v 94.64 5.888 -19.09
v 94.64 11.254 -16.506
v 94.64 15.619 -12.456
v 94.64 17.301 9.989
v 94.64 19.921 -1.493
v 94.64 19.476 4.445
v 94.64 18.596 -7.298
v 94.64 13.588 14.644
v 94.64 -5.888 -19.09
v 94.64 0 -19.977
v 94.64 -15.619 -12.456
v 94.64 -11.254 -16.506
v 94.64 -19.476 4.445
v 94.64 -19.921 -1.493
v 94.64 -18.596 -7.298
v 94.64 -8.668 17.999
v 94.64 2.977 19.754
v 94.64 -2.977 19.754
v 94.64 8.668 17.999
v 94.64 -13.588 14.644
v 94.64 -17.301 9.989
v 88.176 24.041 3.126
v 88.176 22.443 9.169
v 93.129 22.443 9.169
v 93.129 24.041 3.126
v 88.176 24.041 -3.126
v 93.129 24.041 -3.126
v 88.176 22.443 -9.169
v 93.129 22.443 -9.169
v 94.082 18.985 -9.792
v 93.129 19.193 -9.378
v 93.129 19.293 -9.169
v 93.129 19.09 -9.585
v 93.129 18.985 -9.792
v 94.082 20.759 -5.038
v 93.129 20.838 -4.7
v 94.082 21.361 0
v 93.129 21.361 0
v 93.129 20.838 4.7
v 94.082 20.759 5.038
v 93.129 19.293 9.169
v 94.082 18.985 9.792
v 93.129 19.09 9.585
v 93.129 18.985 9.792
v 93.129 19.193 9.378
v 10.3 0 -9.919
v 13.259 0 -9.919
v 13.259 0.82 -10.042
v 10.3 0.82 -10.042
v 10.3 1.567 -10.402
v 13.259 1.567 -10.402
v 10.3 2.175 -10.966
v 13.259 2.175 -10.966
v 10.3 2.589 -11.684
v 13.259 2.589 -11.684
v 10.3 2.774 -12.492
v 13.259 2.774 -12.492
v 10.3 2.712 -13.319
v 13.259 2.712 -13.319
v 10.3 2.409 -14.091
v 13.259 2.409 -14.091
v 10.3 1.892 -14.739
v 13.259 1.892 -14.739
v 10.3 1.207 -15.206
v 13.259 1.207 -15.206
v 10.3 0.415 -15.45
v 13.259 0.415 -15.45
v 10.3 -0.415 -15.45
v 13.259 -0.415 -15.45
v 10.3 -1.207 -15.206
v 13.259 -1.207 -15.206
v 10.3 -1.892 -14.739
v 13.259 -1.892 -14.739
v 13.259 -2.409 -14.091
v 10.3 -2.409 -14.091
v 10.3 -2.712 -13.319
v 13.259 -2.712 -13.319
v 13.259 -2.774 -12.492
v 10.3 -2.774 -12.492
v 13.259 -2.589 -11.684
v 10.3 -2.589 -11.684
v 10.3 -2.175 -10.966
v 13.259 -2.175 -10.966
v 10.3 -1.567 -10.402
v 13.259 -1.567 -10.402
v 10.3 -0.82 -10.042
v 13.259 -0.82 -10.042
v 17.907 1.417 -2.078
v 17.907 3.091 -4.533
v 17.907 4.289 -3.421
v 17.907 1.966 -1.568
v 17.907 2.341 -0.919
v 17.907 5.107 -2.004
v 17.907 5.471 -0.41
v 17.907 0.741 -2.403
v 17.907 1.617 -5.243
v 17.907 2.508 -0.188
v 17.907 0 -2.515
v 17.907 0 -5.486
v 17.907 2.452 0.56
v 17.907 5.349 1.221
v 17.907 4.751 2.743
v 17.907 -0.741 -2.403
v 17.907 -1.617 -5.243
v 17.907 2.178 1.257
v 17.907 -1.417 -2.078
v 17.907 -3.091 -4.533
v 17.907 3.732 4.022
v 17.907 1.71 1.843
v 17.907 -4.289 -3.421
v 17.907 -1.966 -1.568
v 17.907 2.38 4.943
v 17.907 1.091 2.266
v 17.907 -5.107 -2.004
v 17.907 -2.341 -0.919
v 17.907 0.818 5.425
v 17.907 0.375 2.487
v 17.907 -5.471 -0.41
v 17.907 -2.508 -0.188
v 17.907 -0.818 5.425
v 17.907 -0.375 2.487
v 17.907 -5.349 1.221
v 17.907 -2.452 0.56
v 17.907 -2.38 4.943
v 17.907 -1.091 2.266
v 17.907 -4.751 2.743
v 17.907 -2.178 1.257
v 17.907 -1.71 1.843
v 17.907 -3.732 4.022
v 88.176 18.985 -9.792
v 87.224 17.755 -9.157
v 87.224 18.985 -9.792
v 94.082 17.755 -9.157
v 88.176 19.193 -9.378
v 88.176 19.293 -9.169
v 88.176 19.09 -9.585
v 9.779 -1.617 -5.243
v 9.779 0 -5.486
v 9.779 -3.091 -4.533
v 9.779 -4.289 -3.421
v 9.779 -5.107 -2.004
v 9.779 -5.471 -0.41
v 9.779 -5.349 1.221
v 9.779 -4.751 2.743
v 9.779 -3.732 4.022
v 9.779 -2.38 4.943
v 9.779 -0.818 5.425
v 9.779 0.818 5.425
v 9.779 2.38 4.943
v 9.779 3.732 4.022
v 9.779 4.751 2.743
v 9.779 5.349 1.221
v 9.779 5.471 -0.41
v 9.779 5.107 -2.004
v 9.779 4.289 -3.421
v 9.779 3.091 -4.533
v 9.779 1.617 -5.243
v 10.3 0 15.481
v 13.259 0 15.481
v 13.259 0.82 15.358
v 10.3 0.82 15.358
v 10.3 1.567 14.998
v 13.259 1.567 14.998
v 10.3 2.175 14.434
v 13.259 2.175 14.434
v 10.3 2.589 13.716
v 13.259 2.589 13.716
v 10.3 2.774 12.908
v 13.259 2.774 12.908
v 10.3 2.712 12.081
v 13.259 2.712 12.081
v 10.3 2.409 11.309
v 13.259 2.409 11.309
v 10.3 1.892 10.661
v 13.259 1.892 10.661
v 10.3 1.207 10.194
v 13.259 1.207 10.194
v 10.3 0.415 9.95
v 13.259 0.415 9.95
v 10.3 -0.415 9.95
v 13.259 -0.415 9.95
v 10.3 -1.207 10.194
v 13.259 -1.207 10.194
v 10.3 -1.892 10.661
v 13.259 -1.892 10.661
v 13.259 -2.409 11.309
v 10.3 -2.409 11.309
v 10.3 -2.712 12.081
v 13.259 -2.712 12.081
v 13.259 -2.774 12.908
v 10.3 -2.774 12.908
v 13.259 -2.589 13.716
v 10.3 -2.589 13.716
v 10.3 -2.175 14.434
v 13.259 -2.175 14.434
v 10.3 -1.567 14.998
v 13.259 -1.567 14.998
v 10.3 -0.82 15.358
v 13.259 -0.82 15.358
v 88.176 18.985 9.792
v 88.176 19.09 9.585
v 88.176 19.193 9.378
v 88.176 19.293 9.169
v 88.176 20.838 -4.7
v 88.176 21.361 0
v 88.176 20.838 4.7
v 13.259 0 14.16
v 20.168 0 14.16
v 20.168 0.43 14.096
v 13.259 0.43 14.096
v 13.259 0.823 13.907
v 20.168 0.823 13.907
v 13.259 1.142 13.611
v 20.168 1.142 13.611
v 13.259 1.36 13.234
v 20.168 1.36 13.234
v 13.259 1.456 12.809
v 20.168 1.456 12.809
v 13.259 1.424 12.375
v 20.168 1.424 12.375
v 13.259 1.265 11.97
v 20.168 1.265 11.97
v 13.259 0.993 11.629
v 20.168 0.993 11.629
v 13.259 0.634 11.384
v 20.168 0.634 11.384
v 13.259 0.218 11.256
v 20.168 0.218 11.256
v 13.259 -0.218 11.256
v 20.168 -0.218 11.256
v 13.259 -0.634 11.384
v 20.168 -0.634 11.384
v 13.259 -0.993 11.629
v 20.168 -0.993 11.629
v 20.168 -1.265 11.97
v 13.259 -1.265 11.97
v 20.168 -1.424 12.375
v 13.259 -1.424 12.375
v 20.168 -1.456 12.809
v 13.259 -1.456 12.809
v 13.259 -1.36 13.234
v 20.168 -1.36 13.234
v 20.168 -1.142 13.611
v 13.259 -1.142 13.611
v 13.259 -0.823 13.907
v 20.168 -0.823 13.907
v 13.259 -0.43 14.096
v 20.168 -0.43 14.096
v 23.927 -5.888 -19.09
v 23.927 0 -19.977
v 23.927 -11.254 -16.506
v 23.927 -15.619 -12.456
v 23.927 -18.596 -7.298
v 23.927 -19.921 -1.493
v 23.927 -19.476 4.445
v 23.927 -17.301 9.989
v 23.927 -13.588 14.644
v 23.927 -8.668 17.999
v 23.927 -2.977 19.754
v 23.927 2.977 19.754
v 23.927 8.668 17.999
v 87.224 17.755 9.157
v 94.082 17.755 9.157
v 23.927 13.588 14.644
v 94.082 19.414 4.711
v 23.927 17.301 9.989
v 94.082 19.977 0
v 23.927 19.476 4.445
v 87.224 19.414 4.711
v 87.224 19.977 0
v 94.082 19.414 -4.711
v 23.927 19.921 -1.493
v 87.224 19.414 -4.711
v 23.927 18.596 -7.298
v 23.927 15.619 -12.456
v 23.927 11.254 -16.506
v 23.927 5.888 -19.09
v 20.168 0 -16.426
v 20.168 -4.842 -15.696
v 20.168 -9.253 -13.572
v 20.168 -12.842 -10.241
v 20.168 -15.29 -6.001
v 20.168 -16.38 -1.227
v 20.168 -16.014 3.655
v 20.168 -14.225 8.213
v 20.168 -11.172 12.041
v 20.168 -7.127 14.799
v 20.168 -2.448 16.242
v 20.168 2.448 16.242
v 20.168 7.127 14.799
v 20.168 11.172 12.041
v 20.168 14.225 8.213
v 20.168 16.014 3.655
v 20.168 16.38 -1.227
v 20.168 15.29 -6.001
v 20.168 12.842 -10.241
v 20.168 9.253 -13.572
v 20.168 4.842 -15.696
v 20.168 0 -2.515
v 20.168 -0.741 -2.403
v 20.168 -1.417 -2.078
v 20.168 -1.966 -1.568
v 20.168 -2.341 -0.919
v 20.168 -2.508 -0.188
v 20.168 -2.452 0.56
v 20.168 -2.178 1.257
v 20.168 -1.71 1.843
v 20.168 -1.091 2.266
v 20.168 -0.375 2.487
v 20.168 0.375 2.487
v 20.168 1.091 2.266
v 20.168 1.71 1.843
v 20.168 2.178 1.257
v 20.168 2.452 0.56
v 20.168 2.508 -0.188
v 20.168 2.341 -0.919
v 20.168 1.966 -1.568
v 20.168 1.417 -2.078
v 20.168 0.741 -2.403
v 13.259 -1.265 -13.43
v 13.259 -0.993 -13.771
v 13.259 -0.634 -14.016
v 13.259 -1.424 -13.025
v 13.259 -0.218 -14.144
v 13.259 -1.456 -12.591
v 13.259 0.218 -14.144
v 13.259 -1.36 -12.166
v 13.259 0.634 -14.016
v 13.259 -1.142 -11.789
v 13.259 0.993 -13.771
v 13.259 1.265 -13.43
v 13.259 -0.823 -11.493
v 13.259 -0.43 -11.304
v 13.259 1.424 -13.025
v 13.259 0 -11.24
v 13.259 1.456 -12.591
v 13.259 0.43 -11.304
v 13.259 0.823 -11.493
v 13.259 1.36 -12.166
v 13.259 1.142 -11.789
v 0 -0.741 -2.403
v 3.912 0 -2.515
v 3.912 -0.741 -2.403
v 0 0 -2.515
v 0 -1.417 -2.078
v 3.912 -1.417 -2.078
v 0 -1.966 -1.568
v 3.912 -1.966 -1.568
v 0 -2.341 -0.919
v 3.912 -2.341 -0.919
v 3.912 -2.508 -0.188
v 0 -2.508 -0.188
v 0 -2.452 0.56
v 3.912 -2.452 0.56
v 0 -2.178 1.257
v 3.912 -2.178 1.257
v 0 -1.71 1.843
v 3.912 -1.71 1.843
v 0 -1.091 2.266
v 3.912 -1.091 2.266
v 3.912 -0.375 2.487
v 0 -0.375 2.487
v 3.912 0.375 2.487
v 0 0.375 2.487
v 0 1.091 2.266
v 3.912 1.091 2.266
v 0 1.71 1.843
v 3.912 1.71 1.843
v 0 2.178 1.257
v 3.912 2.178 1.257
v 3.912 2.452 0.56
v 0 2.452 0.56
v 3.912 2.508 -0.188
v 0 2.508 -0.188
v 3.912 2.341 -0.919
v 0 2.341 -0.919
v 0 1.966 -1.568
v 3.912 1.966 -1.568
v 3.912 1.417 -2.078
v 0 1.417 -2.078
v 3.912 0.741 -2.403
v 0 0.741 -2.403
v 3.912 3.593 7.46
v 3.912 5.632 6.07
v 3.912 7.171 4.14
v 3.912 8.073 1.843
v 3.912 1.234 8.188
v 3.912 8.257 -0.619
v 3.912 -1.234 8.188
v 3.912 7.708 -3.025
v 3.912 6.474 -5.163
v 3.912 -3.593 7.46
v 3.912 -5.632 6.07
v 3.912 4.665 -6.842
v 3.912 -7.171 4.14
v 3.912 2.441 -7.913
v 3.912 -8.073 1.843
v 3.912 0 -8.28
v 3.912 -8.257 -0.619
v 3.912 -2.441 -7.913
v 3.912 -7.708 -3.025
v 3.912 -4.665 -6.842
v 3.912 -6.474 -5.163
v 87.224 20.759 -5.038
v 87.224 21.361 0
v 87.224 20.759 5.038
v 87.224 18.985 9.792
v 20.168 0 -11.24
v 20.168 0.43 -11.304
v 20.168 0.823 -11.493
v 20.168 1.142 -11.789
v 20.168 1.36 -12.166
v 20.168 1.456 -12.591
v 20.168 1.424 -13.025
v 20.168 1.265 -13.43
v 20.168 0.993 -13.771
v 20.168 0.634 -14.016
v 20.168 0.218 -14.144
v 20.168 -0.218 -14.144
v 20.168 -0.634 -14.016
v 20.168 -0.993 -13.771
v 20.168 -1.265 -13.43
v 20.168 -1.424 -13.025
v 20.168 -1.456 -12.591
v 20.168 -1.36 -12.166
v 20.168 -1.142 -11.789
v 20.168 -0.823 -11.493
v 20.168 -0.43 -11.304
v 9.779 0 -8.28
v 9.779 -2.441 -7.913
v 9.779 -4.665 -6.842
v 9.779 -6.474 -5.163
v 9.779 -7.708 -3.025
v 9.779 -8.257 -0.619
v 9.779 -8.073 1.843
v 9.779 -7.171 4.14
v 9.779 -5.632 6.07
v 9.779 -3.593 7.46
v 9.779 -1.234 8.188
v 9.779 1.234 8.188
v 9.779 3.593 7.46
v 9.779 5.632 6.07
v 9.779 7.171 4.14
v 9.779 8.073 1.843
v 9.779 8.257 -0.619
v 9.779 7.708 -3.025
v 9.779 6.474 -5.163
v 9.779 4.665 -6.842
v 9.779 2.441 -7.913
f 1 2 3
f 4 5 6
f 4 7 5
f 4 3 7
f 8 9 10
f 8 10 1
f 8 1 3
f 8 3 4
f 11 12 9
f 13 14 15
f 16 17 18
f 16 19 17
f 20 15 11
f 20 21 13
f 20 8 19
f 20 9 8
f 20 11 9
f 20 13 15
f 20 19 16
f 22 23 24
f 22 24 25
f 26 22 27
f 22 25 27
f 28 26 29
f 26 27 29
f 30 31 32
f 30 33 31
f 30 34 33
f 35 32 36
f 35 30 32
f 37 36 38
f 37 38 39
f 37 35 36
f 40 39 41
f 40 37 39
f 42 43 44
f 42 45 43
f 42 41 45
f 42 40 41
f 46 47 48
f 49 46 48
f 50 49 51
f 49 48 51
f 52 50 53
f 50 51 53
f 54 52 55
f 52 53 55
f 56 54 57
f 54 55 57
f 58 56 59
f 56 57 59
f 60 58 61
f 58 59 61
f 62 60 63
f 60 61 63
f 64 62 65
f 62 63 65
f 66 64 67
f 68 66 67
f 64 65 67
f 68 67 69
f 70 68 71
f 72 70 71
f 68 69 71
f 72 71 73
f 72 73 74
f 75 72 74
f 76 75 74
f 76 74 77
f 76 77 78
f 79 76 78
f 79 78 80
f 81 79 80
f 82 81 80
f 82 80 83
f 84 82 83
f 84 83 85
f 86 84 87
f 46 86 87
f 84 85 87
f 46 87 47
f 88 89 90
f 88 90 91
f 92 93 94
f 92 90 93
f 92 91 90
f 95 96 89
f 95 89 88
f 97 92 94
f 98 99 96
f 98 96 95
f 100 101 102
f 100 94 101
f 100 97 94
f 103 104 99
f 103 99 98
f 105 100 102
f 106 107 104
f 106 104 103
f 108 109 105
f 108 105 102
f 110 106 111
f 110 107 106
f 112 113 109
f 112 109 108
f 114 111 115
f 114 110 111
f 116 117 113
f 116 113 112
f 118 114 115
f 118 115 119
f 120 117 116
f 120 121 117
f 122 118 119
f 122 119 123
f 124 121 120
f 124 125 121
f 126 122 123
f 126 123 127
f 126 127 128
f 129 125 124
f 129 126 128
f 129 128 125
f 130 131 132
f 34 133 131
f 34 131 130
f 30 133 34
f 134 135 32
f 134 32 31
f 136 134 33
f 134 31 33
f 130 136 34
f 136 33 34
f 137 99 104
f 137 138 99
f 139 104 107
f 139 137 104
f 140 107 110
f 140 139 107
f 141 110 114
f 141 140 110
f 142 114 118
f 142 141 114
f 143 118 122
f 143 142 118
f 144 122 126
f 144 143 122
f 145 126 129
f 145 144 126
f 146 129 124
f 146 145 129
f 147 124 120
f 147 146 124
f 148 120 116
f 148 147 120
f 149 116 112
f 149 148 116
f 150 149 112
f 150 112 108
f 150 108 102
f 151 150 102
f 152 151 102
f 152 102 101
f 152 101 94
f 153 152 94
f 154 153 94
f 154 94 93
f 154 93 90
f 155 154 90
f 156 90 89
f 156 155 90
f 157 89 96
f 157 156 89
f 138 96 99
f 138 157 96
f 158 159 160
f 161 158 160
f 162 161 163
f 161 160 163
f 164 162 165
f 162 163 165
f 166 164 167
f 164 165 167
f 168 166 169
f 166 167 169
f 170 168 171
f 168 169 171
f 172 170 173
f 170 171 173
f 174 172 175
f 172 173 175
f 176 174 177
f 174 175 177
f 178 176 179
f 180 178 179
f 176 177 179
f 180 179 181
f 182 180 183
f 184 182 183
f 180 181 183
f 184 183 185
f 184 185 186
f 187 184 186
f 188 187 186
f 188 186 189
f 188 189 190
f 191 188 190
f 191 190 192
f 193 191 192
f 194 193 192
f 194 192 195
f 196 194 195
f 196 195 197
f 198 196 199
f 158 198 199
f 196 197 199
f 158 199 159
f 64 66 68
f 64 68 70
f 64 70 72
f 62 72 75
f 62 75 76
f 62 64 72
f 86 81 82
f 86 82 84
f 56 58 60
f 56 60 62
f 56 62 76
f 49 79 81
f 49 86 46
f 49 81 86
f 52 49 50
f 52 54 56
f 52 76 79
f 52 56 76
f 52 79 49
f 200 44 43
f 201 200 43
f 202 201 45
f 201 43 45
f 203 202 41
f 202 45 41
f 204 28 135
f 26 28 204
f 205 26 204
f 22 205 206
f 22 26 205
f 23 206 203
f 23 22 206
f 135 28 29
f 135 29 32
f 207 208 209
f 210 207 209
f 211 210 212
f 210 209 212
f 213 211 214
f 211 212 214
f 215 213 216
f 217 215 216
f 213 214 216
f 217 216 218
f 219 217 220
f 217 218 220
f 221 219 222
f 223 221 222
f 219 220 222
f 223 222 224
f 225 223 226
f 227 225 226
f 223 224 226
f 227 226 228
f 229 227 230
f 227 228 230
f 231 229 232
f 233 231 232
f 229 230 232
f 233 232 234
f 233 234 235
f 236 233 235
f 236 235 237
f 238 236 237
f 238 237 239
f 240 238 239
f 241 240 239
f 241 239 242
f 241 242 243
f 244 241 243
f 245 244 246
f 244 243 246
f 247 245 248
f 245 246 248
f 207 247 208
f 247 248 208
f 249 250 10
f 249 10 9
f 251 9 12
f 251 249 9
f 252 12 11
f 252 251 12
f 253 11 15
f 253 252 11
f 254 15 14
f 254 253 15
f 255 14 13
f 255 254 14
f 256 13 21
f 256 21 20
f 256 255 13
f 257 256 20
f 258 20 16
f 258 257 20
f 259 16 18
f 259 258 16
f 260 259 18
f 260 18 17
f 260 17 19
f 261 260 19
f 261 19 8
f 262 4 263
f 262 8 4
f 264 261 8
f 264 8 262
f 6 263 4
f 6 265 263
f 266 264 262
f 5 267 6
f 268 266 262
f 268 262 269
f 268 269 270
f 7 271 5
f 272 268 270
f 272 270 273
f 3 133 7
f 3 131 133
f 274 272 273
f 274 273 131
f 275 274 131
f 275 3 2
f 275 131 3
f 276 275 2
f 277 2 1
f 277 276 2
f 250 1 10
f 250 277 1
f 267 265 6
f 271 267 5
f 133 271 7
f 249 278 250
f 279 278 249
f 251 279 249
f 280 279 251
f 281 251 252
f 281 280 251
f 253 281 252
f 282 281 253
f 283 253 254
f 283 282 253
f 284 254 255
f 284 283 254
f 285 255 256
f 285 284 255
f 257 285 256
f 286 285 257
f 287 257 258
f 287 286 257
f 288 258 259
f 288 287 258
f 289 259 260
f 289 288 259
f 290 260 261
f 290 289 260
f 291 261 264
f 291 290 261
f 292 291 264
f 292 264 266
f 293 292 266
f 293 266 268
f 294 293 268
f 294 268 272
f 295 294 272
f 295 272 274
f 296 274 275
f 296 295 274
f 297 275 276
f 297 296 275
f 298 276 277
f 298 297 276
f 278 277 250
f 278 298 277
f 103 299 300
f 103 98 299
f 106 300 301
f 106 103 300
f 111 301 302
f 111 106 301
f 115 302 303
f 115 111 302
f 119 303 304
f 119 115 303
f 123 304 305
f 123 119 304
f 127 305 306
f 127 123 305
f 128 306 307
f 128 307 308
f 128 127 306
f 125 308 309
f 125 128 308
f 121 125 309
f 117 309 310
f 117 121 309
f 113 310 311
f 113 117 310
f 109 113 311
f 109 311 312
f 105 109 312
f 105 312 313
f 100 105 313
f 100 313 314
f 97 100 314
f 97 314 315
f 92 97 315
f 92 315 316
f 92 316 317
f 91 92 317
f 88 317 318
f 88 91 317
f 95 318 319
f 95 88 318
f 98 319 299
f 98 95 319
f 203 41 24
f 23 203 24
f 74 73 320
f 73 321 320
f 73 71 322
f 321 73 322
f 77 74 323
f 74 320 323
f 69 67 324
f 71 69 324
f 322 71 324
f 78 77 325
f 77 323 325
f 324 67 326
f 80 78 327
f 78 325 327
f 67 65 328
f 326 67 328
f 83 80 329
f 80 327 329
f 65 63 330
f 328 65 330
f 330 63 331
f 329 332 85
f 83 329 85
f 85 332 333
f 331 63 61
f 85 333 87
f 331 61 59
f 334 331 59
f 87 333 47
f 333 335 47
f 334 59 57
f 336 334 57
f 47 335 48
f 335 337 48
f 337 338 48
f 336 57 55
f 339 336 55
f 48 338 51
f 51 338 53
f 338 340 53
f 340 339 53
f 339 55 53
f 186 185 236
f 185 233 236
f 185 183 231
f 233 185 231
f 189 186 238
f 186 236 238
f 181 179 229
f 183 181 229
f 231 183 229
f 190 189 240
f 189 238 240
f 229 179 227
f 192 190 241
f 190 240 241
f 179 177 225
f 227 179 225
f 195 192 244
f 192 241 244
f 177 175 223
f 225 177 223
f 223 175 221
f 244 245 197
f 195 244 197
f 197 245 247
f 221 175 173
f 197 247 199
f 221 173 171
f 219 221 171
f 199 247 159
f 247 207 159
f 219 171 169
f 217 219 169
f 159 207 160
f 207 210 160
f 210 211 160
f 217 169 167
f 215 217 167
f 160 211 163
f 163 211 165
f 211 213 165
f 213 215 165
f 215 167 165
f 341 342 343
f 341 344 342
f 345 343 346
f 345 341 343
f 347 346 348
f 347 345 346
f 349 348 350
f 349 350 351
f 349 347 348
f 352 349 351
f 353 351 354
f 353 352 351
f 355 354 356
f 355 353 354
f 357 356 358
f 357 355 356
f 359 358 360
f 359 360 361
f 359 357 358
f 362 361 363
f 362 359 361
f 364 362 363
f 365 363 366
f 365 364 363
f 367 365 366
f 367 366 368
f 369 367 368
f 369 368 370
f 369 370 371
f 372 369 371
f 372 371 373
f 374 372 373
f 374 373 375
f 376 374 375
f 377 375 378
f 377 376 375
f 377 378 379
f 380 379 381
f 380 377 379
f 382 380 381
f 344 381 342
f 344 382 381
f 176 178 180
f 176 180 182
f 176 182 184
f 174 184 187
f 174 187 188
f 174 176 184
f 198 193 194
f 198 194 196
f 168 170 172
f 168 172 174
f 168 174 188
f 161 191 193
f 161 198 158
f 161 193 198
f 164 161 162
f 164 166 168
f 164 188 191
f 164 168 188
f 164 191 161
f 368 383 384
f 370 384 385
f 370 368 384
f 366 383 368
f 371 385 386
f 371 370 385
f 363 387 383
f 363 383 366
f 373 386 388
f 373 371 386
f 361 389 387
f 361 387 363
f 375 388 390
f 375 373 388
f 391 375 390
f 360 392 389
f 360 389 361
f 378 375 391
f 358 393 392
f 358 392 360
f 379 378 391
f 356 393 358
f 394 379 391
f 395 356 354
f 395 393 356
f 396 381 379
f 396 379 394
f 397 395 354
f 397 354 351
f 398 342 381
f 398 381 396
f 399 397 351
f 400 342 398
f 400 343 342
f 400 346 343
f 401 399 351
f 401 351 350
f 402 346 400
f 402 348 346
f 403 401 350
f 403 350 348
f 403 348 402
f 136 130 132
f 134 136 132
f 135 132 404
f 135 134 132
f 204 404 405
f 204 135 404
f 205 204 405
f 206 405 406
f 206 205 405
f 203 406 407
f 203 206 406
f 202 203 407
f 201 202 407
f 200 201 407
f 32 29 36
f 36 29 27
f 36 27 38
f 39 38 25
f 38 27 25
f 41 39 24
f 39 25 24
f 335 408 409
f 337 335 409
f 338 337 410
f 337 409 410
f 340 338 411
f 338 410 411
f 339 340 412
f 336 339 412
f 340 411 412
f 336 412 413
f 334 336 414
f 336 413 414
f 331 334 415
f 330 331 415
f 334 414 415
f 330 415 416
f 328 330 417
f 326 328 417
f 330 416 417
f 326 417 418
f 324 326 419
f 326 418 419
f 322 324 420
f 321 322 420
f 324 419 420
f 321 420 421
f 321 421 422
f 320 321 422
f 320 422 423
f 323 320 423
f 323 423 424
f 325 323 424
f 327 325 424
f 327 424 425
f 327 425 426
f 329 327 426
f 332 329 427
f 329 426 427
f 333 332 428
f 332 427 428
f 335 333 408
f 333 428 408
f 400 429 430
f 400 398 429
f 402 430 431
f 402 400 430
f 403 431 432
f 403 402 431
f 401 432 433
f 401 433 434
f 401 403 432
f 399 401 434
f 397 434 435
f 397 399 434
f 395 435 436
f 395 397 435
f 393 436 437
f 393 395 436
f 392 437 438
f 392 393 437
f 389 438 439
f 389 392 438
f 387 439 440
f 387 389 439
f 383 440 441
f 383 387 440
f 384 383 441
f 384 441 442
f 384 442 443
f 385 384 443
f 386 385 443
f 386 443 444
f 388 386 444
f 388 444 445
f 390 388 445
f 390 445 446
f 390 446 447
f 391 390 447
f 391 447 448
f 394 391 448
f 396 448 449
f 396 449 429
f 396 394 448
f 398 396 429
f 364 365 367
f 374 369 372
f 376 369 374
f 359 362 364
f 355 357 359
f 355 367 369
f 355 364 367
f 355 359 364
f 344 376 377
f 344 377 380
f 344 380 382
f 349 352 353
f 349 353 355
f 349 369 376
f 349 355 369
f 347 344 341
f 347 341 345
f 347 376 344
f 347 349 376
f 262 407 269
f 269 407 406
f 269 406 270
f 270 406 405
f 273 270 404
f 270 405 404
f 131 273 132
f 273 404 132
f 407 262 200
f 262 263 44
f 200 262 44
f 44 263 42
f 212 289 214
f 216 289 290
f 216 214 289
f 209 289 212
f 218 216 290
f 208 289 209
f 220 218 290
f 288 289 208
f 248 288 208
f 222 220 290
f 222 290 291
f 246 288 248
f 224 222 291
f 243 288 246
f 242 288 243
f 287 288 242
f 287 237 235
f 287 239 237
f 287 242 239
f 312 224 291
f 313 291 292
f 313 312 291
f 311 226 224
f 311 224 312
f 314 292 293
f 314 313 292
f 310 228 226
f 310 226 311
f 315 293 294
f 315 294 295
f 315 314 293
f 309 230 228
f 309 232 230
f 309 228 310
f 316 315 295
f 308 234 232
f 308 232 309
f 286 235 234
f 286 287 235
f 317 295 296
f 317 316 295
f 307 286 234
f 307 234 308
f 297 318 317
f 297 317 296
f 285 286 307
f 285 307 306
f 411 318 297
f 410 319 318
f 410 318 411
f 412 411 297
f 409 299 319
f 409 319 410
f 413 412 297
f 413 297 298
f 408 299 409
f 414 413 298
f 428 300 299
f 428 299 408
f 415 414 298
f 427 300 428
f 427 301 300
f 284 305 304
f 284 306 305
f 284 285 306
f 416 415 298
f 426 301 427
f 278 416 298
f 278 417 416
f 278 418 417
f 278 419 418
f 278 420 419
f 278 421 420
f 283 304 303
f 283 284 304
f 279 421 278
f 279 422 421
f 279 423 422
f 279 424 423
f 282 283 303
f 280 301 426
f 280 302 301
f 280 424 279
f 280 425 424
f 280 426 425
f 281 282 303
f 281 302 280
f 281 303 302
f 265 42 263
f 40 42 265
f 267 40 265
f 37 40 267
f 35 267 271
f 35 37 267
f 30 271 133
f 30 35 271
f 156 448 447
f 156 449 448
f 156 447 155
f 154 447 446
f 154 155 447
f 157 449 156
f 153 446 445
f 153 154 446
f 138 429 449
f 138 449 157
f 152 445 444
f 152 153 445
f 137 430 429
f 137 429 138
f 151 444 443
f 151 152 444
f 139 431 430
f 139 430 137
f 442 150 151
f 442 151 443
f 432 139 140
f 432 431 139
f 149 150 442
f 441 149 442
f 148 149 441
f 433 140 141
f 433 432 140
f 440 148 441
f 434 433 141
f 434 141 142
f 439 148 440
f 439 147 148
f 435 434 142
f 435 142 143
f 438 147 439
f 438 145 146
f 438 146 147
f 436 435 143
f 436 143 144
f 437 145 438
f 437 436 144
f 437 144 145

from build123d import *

# Parameters (mm, degrees)
BOSS_EXTRUDE1_DEPTH = 3.429
BOSS_EXTRUDE2_DEPTH = 2.4765
SKETCH7_R           = 1.4605
BOSS_EXTRUDE5_DEPTH = 6.9088
SKETCH8_R           = 2.7813
BOSS_EXTRUDE6_DEPTH = 2.9591


with BuildPart() as part:
    # Sketch1 → Revolve1 (revolve)
    with BuildSketch(Plane.XY, mode=Mode.PRIVATE) as revolve1_sk:
        Polygon((94.6404, 0), (94.6404, 19.9771), (23.9268, 19.9771), (20.1676, 16.42566681), (20.1676, 2.5146), (17.907, 2.5146), (17.907, 5.4864), (9.779, 5.4864), (9.779, 8.2804), (3.9116, 8.2804), (3.9116, 2.5146), (0, 2.5146), (0, 0), align=None)
    revolve(revolve1_sk.sketch.rotate(Axis((94.6404, 0, 0), (-1, 0, 0)), 90), axis=Axis((94.6404, 0, 0), (-1, 0, 0)))

    # Sketch3 → Boss-Extrude1 (add, symmetric)
    with BuildSketch(Plane(origin=(90.6526, 0, 0), x_dir=(0, 0, -1), z_dir=(1, 0, 0))):
        with BuildLine():
            Line((-9.7917, 18.985047302), (-9.157160583, 17.754743999))
            ThreePointArc((-9.157160583, 17.754743999), (0, -19.9771), (9.157160583, 17.754743999))
            Line((9.157160583, 17.754743999), (9.7917, 18.985047302))
            ThreePointArc((9.7917, 18.985047302), (0, 21.3614), (-9.7917, 18.985047302))
        make_face()
    extrude(amount=BOSS_EXTRUDE1_DEPTH, both=True)

    # Sketch4 → Boss-Extrude2 (add, symmetric)
    with BuildSketch(Plane(origin=(90.6526, 0, 0), x_dir=(0, 0, -1), z_dir=(1, 0, 0))):
        with BuildLine():
            Line((-9.1694, 19.293302299), (-9.1694, 22.442902299))
            ThreePointArc((-9.1694, 22.442902299), (0, 24.243798381), (9.1694, 22.442902299))
            Line((9.1694, 22.442902299), (9.1694, 19.293302299))
            ThreePointArc((9.1694, 19.293302299), (9.48180276, 19.141703852), (9.7917, 18.985047302))
            Line((9.7917, 18.985047302), (9.157160583, 17.754743999))
            ThreePointArc((9.157160583, 17.754743999), (0, 19.9771), (-9.157160583, 17.754743999))
            Line((-9.157160583, 17.754743999), (-9.7917, 18.985047302))
            ThreePointArc((-9.7917, 18.985047302), (-9.48180276, 19.141703852), (-9.1694, 19.293302299))
        make_face()
    extrude(amount=BOSS_EXTRUDE2_DEPTH, both=True)

    # Sketch7 → Boss-Extrude5 (add)
    with BuildSketch(Plane.ZY.offset(-20.1676)):
        with Locations((-12.7, 0)):
            Circle(SKETCH7_R)
        with Locations((12.7, 0)):
            Circle(SKETCH7_R)
    extrude(amount=BOSS_EXTRUDE5_DEPTH)

    # Sketch8 → Boss-Extrude6 (add)
    with BuildSketch(Plane.ZY.offset(-13.2588)):
        with Locations((12.7, 0)):
            Circle(SKETCH8_R)
        with Locations((-12.7, 0)):
            Circle(SKETCH8_R)
    extrude(amount=BOSS_EXTRUDE6_DEPTH)


solid = part.part
